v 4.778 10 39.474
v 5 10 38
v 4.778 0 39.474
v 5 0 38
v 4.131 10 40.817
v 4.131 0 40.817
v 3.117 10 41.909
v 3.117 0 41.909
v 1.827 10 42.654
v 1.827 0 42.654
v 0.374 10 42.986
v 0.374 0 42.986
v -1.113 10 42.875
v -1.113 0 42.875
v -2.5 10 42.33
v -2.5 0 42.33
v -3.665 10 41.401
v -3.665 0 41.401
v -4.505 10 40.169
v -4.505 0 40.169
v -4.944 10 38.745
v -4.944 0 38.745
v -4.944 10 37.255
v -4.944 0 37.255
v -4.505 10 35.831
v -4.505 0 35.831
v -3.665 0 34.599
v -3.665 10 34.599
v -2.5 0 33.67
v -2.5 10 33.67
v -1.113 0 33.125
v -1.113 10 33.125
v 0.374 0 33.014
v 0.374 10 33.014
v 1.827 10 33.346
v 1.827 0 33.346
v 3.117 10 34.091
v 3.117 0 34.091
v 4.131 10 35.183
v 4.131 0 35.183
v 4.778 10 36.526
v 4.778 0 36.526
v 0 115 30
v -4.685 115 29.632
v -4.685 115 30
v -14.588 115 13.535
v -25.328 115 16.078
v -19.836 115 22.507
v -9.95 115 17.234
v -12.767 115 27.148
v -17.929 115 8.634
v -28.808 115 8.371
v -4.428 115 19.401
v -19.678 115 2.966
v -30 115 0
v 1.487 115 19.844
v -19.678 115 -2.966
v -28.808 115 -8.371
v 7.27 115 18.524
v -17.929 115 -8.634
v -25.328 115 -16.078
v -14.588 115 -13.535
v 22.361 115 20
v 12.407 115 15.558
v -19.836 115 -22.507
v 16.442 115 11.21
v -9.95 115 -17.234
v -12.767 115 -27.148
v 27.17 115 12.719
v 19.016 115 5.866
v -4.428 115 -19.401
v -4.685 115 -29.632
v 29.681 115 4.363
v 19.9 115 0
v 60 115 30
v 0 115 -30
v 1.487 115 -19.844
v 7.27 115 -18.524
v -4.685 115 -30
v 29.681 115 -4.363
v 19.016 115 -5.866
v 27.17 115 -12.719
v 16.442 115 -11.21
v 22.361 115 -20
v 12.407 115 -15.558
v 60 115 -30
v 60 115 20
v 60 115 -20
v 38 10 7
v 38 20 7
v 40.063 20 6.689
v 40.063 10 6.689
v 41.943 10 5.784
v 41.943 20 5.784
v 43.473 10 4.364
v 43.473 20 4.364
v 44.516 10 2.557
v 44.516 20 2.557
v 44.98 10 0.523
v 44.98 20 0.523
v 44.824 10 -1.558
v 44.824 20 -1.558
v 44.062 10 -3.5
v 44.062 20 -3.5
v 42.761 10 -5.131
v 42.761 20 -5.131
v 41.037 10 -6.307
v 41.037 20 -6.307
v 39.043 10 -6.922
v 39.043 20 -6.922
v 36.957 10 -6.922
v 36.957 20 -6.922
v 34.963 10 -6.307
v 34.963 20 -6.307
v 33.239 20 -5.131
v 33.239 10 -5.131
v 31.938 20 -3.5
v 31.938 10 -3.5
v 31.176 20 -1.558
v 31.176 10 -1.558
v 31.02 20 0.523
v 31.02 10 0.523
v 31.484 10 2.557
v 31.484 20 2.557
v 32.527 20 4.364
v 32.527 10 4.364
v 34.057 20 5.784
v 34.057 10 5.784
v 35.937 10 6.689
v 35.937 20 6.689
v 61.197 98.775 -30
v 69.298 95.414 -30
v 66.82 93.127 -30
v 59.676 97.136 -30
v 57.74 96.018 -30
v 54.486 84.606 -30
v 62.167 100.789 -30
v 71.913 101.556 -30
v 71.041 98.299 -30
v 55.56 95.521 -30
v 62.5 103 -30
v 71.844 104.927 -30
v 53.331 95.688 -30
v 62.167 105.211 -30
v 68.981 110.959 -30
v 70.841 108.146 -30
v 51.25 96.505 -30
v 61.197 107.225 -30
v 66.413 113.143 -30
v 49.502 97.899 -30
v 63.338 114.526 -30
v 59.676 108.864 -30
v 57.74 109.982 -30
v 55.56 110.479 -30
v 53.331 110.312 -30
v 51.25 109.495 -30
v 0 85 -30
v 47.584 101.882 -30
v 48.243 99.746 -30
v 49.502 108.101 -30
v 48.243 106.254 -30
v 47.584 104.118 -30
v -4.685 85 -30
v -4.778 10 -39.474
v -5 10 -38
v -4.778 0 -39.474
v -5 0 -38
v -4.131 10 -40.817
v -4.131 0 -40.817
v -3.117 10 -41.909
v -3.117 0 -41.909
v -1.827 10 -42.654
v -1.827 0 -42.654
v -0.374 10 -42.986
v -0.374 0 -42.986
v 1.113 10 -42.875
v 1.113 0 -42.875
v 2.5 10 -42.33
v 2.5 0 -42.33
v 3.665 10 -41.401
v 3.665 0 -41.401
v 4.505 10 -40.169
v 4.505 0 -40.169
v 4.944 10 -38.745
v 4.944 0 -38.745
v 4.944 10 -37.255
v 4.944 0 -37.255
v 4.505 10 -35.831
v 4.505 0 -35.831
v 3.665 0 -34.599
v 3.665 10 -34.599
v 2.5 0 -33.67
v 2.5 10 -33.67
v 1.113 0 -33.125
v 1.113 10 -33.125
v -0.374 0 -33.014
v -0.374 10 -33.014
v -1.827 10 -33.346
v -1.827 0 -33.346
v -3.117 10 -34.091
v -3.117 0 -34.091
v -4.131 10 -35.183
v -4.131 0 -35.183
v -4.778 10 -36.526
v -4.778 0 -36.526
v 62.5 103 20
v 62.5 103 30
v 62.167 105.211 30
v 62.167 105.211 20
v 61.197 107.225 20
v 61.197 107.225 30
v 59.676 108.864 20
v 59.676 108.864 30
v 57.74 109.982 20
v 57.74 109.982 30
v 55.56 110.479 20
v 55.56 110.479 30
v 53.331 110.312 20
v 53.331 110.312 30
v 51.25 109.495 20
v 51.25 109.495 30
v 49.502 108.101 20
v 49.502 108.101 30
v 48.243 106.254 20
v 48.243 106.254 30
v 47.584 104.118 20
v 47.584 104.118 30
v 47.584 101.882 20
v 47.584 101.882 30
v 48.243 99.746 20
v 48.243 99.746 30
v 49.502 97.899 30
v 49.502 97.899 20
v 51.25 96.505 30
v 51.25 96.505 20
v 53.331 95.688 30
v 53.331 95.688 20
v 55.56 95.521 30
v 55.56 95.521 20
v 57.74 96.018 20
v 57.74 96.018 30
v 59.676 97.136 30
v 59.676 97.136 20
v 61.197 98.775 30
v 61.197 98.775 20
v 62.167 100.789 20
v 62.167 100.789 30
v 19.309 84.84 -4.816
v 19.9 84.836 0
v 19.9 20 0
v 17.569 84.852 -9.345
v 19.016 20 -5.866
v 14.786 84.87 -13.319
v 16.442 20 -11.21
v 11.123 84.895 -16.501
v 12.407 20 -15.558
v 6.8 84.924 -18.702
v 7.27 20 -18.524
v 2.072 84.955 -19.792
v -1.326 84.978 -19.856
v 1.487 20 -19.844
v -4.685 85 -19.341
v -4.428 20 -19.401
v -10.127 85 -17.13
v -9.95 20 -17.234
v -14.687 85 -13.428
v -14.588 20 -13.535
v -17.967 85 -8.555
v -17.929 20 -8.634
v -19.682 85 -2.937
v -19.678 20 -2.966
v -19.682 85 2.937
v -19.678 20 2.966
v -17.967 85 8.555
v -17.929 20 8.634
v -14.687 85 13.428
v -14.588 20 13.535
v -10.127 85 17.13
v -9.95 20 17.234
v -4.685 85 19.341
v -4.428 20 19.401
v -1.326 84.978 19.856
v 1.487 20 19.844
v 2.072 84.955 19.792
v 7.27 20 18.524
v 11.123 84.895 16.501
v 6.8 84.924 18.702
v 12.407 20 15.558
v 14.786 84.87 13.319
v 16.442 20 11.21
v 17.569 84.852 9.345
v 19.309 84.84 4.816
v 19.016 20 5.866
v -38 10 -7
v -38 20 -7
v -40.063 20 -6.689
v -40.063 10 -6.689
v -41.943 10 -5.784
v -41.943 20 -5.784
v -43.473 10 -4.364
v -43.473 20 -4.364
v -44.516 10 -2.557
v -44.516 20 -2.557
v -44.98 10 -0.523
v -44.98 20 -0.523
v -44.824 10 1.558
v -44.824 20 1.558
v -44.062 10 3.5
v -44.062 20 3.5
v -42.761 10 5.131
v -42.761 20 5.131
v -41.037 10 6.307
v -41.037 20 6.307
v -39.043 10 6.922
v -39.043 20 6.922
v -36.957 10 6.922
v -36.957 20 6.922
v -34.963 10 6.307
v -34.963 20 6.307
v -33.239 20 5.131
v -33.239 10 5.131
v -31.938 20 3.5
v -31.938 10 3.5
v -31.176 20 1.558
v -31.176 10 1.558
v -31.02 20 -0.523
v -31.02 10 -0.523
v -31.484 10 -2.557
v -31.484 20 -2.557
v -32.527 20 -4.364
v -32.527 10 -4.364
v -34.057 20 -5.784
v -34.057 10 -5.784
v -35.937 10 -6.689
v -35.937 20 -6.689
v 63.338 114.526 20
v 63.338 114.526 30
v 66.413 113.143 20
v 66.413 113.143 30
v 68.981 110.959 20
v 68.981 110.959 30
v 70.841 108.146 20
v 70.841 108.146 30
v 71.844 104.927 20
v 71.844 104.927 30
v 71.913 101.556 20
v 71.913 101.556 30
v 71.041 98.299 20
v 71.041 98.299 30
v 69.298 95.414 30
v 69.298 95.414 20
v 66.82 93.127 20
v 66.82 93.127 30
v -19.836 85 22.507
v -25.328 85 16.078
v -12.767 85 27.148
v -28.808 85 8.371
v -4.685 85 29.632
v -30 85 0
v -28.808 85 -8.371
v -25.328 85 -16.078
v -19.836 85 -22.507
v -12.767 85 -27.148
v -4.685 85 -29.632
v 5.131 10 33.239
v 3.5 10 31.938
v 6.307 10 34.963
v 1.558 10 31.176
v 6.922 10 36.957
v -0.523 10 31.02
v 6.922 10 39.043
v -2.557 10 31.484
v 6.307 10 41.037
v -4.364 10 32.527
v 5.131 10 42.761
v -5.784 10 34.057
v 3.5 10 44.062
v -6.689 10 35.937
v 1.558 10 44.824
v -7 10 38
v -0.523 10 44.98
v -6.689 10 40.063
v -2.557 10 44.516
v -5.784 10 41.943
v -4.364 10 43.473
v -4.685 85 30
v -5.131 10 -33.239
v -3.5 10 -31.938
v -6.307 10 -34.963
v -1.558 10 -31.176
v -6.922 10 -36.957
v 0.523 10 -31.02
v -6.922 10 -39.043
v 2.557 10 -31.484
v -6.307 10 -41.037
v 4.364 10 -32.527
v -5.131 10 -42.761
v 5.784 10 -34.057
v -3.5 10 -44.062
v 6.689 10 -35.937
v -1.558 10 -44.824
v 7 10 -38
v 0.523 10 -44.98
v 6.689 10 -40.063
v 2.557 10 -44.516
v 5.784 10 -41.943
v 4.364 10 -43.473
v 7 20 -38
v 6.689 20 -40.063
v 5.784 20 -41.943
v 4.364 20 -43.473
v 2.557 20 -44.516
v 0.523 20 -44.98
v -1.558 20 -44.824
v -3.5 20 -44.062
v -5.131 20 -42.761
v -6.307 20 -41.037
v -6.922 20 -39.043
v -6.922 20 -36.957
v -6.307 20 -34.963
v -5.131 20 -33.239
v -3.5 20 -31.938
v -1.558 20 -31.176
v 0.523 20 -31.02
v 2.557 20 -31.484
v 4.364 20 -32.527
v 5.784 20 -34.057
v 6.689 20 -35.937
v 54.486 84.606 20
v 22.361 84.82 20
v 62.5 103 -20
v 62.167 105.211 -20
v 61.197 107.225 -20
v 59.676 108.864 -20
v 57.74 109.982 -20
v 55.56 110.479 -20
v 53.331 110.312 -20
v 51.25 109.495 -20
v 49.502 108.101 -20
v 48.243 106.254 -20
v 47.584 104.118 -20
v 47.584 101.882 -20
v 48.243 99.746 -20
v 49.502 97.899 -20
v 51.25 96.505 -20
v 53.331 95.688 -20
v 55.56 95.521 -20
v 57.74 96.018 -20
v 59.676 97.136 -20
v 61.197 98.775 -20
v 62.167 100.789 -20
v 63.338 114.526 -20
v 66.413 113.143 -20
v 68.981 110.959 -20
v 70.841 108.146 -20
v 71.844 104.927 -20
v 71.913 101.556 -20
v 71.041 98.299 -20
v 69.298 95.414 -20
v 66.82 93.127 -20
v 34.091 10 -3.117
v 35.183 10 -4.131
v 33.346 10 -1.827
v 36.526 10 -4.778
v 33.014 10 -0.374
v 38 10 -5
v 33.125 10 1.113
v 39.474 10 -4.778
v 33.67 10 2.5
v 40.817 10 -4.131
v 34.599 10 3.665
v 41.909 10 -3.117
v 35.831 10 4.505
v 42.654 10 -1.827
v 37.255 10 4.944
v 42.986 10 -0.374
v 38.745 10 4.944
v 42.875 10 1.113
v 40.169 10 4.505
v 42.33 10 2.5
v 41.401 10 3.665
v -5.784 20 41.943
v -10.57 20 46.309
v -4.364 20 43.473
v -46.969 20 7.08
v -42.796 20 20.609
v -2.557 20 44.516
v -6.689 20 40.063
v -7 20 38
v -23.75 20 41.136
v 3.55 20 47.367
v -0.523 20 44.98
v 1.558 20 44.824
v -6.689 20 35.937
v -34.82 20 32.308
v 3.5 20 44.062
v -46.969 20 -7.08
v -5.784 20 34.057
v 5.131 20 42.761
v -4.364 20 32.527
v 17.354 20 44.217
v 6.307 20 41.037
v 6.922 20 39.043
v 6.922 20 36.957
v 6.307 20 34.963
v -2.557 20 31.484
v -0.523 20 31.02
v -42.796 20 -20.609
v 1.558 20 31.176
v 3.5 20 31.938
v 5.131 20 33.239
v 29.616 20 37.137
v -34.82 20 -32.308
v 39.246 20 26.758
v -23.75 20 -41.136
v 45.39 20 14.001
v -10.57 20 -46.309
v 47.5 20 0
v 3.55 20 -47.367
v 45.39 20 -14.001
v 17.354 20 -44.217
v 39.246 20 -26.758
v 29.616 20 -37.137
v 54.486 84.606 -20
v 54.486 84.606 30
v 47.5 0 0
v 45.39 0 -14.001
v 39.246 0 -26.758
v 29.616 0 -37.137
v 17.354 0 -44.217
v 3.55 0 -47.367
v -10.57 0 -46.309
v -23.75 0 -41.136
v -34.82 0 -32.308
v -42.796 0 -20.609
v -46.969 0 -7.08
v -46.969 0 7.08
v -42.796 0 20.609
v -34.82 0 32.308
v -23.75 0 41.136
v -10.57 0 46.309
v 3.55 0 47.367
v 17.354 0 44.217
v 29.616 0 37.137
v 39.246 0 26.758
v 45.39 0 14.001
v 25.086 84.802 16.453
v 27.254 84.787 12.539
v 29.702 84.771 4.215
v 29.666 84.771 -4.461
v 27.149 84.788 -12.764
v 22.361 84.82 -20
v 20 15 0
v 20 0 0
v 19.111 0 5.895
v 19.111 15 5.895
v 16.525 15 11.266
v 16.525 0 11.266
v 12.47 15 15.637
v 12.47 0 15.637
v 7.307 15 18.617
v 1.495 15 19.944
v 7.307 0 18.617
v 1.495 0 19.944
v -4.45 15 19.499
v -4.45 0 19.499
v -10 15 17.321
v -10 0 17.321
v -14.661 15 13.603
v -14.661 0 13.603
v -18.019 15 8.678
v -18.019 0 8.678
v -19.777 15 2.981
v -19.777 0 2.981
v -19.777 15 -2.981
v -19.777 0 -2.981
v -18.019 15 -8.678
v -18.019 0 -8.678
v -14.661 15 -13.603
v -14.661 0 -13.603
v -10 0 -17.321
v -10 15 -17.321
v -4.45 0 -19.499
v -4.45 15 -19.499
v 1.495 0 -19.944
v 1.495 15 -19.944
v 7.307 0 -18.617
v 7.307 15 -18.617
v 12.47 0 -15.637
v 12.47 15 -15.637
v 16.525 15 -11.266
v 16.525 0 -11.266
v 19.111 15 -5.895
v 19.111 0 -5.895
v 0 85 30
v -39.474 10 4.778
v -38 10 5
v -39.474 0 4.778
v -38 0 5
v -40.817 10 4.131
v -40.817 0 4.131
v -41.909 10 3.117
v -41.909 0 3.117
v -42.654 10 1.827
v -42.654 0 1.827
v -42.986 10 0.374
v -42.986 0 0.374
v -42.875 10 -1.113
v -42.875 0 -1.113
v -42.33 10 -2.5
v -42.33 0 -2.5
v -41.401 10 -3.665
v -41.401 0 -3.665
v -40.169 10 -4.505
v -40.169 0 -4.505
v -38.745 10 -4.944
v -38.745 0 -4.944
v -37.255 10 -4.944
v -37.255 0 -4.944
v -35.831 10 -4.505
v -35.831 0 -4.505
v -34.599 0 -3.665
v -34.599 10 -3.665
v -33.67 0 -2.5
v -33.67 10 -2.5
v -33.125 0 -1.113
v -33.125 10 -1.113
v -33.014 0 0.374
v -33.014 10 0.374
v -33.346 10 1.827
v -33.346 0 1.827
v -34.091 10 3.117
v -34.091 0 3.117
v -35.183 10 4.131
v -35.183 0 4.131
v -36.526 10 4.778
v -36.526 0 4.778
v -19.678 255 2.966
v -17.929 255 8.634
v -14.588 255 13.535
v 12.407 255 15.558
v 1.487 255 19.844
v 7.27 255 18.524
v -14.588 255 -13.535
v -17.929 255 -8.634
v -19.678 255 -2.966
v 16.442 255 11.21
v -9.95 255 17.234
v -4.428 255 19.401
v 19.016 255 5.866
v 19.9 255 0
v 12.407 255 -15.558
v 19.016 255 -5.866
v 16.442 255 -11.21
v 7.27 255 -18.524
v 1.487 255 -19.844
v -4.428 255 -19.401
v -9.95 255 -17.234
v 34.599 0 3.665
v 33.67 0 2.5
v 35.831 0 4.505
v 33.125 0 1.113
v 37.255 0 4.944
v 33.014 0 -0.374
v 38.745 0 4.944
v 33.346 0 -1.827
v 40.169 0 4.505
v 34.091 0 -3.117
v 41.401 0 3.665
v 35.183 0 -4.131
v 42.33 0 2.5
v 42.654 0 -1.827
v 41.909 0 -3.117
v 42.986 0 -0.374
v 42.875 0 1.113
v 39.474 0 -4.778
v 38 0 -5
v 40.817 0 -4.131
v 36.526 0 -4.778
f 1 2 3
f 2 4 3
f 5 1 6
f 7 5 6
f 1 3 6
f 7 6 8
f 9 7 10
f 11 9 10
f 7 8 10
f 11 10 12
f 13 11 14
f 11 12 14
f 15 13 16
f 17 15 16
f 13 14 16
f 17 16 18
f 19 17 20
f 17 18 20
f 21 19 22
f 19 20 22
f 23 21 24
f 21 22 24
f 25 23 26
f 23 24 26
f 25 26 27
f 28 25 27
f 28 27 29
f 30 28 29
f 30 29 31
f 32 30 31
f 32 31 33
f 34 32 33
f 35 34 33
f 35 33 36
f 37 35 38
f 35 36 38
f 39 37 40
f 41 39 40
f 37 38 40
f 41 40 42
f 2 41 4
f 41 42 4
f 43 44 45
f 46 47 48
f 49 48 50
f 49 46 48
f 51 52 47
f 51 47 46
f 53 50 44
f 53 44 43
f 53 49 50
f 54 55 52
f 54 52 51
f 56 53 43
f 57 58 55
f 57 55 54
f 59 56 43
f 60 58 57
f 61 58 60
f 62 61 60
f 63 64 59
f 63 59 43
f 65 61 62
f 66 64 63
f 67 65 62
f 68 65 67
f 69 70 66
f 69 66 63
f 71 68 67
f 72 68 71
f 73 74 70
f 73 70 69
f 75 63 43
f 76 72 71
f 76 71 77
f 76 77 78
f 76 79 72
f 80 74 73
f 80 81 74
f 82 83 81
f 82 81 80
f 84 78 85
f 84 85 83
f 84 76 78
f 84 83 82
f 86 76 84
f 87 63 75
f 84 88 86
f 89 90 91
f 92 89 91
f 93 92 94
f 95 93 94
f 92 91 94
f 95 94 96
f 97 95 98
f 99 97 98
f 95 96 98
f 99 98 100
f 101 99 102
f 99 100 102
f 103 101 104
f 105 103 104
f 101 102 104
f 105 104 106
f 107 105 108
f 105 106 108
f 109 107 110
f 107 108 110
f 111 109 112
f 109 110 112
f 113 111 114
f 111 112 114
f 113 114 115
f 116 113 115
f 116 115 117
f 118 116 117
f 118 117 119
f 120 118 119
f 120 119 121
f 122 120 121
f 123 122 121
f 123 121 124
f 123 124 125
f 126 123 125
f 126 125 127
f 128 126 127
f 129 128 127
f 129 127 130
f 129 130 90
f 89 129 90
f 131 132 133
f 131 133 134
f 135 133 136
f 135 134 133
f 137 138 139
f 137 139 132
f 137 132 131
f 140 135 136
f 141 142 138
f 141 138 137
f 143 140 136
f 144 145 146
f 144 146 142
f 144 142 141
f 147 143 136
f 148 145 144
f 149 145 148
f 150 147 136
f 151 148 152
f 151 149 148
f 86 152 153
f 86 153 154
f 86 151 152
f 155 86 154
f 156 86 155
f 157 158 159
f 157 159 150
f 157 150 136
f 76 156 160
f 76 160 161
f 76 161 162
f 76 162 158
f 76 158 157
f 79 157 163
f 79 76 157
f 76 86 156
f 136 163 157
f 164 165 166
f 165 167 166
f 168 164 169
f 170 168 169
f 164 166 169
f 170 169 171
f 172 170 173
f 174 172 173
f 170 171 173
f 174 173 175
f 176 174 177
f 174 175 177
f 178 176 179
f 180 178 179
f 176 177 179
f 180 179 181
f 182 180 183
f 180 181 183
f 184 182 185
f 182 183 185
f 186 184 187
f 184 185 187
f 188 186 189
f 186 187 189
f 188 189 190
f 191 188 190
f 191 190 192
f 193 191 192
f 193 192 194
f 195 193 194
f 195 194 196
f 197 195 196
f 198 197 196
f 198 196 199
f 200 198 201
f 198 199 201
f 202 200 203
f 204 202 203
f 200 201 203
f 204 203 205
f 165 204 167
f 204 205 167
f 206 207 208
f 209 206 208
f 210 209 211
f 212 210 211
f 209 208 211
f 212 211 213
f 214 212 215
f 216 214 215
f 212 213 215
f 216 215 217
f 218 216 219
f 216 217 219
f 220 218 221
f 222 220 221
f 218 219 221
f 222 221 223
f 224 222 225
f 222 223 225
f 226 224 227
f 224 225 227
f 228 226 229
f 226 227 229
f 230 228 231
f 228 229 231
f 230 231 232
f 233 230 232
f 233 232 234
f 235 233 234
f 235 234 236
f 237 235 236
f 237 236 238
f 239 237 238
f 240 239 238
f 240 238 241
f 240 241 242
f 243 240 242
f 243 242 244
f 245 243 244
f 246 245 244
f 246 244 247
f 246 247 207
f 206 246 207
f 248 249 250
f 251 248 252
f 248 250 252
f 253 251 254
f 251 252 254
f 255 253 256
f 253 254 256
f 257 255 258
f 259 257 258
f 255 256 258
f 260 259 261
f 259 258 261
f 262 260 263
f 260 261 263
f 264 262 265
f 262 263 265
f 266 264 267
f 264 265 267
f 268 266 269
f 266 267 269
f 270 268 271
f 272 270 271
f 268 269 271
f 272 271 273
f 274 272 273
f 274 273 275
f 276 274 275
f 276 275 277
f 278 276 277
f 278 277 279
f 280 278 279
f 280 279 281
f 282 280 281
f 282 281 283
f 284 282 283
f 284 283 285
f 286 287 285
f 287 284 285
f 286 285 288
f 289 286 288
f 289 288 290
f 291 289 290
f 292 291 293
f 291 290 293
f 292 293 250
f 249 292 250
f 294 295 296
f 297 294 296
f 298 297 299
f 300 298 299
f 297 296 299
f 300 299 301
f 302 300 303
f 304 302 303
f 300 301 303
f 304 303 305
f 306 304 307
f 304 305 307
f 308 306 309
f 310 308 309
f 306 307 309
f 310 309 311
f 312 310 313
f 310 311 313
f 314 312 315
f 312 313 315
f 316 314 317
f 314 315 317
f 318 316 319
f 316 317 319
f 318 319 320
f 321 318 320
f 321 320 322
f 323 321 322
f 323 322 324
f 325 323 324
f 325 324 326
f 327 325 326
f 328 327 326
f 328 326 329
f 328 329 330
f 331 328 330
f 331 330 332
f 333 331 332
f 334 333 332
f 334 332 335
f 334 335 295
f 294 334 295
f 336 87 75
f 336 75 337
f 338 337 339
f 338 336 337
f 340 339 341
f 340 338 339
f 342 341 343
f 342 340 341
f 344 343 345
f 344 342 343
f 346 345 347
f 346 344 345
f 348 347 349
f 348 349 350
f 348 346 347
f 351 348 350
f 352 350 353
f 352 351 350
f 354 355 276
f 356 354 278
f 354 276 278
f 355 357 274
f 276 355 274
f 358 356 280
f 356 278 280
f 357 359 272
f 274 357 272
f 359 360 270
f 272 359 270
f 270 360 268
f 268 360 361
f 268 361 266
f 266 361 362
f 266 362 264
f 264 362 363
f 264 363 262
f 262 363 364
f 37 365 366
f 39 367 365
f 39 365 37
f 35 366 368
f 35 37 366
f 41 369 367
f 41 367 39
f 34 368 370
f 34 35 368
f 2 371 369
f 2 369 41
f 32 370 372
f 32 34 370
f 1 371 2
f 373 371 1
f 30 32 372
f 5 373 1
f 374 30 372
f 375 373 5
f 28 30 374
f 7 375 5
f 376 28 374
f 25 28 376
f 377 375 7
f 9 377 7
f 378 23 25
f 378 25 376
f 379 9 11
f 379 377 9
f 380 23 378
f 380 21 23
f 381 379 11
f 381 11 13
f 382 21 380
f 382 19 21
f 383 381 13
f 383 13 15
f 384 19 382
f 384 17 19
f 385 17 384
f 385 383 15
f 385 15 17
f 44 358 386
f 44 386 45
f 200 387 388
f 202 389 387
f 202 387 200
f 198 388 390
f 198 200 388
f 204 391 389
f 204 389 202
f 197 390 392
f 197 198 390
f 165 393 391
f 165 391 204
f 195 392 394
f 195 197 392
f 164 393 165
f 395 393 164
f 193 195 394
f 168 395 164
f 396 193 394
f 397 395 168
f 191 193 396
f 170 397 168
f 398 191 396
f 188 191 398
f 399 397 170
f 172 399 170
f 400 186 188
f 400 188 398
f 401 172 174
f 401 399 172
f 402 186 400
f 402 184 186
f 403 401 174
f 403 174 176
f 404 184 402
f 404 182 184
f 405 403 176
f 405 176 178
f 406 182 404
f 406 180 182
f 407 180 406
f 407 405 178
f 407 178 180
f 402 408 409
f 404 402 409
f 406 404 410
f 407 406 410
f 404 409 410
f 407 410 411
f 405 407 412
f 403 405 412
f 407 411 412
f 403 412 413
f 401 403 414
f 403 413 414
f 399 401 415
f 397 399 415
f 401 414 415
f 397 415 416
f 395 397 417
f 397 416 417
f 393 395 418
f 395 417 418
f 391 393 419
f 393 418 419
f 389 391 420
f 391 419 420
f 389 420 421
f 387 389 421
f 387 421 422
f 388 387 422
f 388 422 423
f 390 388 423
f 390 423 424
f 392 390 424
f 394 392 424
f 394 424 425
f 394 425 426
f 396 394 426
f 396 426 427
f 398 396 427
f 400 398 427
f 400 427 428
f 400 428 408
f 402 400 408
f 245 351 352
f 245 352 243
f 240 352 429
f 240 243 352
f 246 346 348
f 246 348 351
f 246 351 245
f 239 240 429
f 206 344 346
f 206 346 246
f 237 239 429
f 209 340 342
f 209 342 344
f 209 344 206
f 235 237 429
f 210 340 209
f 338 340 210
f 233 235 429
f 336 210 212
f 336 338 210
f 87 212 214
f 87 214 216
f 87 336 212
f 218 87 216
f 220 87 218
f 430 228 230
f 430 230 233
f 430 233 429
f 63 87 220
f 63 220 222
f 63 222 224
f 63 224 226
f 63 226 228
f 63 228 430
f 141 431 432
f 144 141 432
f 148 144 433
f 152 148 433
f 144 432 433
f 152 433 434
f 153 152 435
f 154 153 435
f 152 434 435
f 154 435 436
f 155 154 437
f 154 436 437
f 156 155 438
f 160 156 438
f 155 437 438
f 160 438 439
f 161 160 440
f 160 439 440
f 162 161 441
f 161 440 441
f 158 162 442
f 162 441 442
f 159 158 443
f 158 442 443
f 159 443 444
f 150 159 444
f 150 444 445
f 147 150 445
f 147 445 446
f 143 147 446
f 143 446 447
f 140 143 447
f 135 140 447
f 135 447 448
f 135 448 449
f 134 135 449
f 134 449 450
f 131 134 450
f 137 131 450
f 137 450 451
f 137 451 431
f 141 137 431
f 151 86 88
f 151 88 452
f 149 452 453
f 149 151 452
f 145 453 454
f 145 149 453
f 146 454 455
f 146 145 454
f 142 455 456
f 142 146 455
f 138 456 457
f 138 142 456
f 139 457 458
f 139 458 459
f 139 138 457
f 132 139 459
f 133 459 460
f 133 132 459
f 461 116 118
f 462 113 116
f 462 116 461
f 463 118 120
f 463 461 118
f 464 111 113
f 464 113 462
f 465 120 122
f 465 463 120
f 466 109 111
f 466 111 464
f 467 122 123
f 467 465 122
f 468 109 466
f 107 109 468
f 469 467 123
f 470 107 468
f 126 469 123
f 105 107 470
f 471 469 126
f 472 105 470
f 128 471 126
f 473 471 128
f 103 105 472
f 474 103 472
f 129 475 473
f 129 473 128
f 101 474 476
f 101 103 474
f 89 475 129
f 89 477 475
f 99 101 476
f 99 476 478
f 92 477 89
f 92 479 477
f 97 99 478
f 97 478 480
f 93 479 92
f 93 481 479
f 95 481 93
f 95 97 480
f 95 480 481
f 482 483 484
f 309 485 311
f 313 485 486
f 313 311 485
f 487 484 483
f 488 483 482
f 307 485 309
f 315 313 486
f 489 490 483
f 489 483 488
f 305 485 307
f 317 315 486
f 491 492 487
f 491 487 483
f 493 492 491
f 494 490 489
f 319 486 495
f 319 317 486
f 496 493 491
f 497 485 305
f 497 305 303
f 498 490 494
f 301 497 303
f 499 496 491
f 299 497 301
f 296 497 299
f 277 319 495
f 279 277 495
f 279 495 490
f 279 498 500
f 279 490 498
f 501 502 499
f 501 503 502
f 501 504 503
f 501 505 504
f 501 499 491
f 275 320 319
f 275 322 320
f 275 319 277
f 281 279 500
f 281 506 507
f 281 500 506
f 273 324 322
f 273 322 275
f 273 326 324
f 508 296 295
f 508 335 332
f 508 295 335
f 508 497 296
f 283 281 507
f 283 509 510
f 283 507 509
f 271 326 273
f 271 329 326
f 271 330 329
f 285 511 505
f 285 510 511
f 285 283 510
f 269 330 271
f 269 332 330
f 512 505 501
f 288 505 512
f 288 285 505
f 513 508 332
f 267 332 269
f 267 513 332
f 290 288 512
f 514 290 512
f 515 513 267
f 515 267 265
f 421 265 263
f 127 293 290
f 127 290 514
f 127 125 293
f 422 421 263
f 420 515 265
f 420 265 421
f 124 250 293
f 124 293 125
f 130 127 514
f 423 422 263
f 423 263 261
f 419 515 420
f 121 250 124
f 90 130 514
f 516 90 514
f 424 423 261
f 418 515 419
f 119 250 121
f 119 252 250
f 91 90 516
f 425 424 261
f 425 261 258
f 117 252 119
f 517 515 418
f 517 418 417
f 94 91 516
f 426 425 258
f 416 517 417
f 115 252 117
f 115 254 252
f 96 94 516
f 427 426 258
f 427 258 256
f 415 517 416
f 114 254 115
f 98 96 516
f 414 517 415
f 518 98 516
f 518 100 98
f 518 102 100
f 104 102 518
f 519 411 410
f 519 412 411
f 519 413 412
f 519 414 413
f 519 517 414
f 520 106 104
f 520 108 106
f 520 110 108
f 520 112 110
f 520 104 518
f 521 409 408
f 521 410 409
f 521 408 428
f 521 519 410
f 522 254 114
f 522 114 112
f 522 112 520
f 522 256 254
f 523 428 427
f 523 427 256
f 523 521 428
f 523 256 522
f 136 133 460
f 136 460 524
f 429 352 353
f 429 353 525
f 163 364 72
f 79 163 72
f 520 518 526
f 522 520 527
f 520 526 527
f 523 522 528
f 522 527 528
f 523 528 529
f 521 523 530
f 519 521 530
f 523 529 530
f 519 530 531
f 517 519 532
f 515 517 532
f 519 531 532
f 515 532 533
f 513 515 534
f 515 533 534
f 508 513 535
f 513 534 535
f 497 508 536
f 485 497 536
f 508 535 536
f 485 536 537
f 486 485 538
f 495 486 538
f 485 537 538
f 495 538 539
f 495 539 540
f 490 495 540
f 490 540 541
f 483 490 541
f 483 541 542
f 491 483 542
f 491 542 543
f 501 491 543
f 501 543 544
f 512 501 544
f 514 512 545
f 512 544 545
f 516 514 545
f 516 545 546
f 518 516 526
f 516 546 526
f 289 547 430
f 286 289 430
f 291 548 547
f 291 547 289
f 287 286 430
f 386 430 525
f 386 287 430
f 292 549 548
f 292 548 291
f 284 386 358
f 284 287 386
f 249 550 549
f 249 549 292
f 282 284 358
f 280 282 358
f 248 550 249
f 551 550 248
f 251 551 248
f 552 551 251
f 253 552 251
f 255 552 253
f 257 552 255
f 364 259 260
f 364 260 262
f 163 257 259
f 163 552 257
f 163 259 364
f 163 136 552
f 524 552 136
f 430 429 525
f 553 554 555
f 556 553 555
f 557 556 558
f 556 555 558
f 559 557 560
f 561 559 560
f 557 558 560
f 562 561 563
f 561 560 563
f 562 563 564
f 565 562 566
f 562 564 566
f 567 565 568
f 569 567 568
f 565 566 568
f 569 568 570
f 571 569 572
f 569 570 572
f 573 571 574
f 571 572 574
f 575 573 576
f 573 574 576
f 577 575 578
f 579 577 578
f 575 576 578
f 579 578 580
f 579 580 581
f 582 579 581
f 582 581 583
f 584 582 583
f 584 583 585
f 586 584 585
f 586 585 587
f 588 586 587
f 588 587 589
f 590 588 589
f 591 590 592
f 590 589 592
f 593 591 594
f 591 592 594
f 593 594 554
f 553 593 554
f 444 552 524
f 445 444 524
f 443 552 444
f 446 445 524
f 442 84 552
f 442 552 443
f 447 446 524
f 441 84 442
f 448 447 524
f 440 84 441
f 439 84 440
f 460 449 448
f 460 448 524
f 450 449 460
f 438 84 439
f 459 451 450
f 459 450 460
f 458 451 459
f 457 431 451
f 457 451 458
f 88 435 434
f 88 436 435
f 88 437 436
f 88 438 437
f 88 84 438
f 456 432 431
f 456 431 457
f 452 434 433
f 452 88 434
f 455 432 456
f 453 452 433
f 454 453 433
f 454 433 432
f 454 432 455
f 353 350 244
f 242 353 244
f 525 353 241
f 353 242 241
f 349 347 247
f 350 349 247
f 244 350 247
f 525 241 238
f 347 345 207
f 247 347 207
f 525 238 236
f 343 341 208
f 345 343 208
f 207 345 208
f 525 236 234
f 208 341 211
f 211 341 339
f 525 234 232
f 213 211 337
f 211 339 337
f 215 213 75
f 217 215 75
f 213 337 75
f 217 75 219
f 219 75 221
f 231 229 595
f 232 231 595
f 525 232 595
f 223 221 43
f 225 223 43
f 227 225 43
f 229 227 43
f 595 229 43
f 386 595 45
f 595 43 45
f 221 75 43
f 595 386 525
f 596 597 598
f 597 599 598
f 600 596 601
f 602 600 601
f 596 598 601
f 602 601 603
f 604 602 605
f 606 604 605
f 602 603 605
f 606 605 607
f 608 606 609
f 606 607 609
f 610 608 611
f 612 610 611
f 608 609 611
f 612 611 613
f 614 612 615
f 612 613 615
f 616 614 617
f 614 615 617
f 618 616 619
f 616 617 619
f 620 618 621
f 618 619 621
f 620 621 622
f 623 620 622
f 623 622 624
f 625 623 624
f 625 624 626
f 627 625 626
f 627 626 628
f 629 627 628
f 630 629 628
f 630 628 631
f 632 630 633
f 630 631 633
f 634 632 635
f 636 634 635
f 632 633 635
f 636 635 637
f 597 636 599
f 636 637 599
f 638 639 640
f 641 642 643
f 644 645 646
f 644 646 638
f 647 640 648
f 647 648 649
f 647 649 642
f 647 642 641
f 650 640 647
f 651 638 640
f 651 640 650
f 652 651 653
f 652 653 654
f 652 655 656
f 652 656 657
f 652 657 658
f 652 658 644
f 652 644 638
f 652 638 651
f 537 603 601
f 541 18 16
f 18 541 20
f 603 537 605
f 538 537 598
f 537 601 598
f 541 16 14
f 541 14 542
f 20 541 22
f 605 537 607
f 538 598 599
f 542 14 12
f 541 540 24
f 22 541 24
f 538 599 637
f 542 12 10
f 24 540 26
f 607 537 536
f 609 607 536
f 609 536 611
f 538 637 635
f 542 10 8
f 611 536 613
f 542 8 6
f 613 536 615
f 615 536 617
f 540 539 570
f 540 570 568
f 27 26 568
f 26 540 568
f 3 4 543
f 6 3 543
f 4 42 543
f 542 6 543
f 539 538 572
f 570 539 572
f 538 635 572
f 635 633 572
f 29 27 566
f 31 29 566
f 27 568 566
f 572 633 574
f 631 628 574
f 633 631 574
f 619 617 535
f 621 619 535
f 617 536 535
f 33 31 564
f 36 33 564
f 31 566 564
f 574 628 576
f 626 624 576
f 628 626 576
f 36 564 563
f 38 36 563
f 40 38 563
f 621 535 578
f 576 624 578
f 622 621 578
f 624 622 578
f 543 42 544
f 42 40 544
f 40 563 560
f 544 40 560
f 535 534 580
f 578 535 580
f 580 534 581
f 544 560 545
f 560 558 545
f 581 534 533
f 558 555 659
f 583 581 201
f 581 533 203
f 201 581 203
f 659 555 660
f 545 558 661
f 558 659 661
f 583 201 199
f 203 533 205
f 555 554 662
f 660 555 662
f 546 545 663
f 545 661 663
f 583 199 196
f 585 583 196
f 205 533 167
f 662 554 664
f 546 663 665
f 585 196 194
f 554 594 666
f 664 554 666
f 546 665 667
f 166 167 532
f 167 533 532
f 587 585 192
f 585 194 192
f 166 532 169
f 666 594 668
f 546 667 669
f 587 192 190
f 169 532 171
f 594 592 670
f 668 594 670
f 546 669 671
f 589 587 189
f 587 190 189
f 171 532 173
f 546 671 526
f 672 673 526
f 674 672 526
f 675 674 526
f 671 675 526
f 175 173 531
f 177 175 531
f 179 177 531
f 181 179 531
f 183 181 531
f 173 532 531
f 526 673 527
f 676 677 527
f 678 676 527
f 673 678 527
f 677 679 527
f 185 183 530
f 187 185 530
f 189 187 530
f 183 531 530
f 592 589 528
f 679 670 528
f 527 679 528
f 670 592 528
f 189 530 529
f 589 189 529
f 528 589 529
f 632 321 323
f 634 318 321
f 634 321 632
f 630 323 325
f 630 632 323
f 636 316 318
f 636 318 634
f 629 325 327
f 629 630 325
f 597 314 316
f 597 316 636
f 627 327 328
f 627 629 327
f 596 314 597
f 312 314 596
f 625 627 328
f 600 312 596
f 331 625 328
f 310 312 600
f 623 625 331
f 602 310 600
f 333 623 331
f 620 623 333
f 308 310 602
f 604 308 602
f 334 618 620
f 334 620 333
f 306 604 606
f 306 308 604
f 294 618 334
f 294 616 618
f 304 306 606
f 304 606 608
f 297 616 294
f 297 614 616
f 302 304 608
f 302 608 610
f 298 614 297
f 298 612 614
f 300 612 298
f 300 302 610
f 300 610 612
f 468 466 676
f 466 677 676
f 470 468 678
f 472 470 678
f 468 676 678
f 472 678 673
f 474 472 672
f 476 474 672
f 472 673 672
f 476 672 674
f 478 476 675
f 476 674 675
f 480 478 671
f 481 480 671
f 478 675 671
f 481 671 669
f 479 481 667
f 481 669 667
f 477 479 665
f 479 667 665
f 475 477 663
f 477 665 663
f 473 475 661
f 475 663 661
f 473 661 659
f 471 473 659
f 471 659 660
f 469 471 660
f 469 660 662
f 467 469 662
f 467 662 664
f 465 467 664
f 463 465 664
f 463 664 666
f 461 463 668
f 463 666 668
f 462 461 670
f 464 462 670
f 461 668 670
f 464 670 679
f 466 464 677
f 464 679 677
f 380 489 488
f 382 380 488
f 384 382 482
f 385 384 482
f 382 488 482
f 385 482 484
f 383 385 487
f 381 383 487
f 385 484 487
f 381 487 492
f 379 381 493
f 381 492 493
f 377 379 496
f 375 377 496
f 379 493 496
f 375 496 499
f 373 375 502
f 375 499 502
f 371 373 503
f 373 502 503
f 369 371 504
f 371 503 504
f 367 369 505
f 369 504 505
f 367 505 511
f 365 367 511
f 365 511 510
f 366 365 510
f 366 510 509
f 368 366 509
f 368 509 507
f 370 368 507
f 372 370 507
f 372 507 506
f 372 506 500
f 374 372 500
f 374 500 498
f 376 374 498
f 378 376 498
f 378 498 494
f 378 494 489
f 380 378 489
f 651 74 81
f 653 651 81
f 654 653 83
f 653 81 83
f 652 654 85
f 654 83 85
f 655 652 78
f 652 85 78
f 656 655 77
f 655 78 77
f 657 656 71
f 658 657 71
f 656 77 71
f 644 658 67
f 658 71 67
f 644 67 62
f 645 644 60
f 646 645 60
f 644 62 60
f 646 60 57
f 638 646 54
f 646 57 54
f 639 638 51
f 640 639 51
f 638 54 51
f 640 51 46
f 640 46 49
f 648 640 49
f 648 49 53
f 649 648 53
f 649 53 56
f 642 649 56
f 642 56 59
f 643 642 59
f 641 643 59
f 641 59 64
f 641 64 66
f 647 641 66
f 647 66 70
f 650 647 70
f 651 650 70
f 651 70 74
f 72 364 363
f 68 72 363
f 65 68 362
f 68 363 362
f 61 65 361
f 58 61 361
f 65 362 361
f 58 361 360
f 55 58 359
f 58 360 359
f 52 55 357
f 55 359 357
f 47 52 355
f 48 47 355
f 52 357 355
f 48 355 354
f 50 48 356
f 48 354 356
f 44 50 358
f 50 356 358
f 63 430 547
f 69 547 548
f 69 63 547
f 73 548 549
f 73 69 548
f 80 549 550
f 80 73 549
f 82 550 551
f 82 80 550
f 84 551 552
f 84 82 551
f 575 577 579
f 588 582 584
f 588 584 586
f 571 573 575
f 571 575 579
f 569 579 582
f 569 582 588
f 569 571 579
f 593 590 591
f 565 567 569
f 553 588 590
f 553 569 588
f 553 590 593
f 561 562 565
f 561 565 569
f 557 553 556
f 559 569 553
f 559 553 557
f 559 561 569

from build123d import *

# Parameters (mm, degrees)
SKETCH1_R                               = 47.5
BOSS_EXTRUDE1_DEPTH                     = 20
SKETCH2_R                               = 19.9
BOSS_EXTRUDE2_DEPTH                     = 65
SKETCH3_R                               = 30
BOSS_EXTRUDE3_DEPTH                     = 30
SKETCH4_R                               = 19.9
BOSS_EXTRUDE4_DEPTH                     = 140
BOSS_EXTRUDE5_DEPTH                     = 30
BOSS_EXTRUDE5_DEPTH_BACK                = 30
CUT_EXTRUDE1_START                      = -40
CUT_EXTRUDE1_DEPTH                      = 40
SKETCH7_R                               = 7.5
CUT_EXTRUDE2_DEPTH                      = 277.071095916
SKETCH8_R                               = 20
CUT_EXTRUDE3_DEPTH                      = 15
CBORE_FOR_M5_HEX_HEAD_BOLT3_D           = 10
CBORE_FOR_M5_HEX_HEAD_BOLT3_CBORE_D     = 14
CBORE_FOR_M5_HEX_HEAD_BOLT3_CBORE_DEPTH = 10
CIRPATTERN1_COUNT                       = 4


with BuildPart() as part:
    # Sketch1 → Boss-Extrude1 (new body)
    with BuildSketch(Plane(origin=(0, 0, 0), x_dir=(1, 0, 0), z_dir=(0, 1, 0))):
        Circle(SKETCH1_R)
    extrude(amount=BOSS_EXTRUDE1_DEPTH)

    # Sketch2 → Boss-Extrude2 (add)
    with BuildSketch(Plane(origin=(0, 20, 0), x_dir=(1, 0, 0), z_dir=(0, 1, 0))):
        Circle(SKETCH2_R)
    extrude(amount=BOSS_EXTRUDE2_DEPTH)

    # Sketch3 → Boss-Extrude3 (add)
    with BuildSketch(Plane(origin=(0, 85, 0), x_dir=(1, 0, 0), z_dir=(0, 1, 0))):
        Circle(SKETCH3_R)
    extrude(amount=BOSS_EXTRUDE3_DEPTH)

    # Sketch4 → Boss-Extrude4 (add)
    with BuildSketch(Plane(origin=(0, 115, 0), x_dir=(1, 0, 0), z_dir=(0, 1, 0))):
        Circle(SKETCH4_R)
    extrude(amount=BOSS_EXTRUDE4_DEPTH)

    # Sketch5 → Boss-Extrude5 (add, two sides: drawn at the far end of the back side and taken through both)
    with BuildSketch(Plane.XY.offset(-BOSS_EXTRUDE5_DEPTH_BACK)):
        with BuildLine():
            Line((-4.684895629, 115), (60, 115))
            ThreePointArc((60, 115), (71.456034828, 106.572011481), (66.820181321, 93.126544336))
            Line((66.820181321, 93.126544336), (54.485559633, 84.606289695))
            Line((54.485559633, 84.606289695), (-4.684895629, 85))
            Line((-4.684895629, 85), (-4.684895629, 115))
        make_face()
    extrude(amount=BOSS_EXTRUDE5_DEPTH + BOSS_EXTRUDE5_DEPTH_BACK)

    # Sketch6 → Cut-Extrude1 (cut)
    with BuildSketch(Plane(origin=(0, 115, 0), x_dir=(1, 0, 0), z_dir=(0, 1, 0)).offset(CUT_EXTRUDE1_START)):
        with BuildLine():
            Line((85.613181264, 20), (85.613181264, -20))
            Line((85.613181264, -20), (22.360679775, -20))
            ThreePointArc((22.360679775, -20), (30, 0), (22.360679775, 20))
            Line((22.360679775, 20), (85.613181264, 20))
        make_face()
    extrude(amount=CUT_EXTRUDE1_DEPTH, mode=Mode.SUBTRACT)

    # Sketch7 → Cut-Extrude2 (cut, through all)
    with BuildSketch(Plane.XY.offset(30)):
        with Locations((55, 103)):
            Circle(SKETCH7_R)
    extrude(amount=-CUT_EXTRUDE2_DEPTH, mode=Mode.SUBTRACT)

    # Sketch8 → Cut-Extrude3 (cut)
    with BuildSketch(Plane.XZ):
        Circle(SKETCH8_R)
    extrude(amount=-CUT_EXTRUDE3_DEPTH, mode=Mode.SUBTRACT)

    # CBORE for M5 Hex Head Bolt3 (through all)
    with Locations(Plane(origin=(0, 20, 0), x_dir=(1, 0, 0), z_dir=(0, 1, 0))):
        with Locations((0, 38)):
            cbore_for_m5_hex_head_bolt3 = CounterBoreHole(CBORE_FOR_M5_HEX_HEAD_BOLT3_D / 2, CBORE_FOR_M5_HEX_HEAD_BOLT3_CBORE_D / 2, CBORE_FOR_M5_HEX_HEAD_BOLT3_CBORE_DEPTH)

    # CirPattern1: CBORE for M5 Hex Head Bolt3 ×4 about axis
    cirpattern1_axis = Axis((0, 20, 0), (0, 1, 0))
    for i in range(1, CIRPATTERN1_COUNT):
        add(cbore_for_m5_hex_head_bolt3.rotate(cirpattern1_axis, i * 360 / CIRPATTERN1_COUNT), mode=Mode.SUBTRACT)


solid = part.part
